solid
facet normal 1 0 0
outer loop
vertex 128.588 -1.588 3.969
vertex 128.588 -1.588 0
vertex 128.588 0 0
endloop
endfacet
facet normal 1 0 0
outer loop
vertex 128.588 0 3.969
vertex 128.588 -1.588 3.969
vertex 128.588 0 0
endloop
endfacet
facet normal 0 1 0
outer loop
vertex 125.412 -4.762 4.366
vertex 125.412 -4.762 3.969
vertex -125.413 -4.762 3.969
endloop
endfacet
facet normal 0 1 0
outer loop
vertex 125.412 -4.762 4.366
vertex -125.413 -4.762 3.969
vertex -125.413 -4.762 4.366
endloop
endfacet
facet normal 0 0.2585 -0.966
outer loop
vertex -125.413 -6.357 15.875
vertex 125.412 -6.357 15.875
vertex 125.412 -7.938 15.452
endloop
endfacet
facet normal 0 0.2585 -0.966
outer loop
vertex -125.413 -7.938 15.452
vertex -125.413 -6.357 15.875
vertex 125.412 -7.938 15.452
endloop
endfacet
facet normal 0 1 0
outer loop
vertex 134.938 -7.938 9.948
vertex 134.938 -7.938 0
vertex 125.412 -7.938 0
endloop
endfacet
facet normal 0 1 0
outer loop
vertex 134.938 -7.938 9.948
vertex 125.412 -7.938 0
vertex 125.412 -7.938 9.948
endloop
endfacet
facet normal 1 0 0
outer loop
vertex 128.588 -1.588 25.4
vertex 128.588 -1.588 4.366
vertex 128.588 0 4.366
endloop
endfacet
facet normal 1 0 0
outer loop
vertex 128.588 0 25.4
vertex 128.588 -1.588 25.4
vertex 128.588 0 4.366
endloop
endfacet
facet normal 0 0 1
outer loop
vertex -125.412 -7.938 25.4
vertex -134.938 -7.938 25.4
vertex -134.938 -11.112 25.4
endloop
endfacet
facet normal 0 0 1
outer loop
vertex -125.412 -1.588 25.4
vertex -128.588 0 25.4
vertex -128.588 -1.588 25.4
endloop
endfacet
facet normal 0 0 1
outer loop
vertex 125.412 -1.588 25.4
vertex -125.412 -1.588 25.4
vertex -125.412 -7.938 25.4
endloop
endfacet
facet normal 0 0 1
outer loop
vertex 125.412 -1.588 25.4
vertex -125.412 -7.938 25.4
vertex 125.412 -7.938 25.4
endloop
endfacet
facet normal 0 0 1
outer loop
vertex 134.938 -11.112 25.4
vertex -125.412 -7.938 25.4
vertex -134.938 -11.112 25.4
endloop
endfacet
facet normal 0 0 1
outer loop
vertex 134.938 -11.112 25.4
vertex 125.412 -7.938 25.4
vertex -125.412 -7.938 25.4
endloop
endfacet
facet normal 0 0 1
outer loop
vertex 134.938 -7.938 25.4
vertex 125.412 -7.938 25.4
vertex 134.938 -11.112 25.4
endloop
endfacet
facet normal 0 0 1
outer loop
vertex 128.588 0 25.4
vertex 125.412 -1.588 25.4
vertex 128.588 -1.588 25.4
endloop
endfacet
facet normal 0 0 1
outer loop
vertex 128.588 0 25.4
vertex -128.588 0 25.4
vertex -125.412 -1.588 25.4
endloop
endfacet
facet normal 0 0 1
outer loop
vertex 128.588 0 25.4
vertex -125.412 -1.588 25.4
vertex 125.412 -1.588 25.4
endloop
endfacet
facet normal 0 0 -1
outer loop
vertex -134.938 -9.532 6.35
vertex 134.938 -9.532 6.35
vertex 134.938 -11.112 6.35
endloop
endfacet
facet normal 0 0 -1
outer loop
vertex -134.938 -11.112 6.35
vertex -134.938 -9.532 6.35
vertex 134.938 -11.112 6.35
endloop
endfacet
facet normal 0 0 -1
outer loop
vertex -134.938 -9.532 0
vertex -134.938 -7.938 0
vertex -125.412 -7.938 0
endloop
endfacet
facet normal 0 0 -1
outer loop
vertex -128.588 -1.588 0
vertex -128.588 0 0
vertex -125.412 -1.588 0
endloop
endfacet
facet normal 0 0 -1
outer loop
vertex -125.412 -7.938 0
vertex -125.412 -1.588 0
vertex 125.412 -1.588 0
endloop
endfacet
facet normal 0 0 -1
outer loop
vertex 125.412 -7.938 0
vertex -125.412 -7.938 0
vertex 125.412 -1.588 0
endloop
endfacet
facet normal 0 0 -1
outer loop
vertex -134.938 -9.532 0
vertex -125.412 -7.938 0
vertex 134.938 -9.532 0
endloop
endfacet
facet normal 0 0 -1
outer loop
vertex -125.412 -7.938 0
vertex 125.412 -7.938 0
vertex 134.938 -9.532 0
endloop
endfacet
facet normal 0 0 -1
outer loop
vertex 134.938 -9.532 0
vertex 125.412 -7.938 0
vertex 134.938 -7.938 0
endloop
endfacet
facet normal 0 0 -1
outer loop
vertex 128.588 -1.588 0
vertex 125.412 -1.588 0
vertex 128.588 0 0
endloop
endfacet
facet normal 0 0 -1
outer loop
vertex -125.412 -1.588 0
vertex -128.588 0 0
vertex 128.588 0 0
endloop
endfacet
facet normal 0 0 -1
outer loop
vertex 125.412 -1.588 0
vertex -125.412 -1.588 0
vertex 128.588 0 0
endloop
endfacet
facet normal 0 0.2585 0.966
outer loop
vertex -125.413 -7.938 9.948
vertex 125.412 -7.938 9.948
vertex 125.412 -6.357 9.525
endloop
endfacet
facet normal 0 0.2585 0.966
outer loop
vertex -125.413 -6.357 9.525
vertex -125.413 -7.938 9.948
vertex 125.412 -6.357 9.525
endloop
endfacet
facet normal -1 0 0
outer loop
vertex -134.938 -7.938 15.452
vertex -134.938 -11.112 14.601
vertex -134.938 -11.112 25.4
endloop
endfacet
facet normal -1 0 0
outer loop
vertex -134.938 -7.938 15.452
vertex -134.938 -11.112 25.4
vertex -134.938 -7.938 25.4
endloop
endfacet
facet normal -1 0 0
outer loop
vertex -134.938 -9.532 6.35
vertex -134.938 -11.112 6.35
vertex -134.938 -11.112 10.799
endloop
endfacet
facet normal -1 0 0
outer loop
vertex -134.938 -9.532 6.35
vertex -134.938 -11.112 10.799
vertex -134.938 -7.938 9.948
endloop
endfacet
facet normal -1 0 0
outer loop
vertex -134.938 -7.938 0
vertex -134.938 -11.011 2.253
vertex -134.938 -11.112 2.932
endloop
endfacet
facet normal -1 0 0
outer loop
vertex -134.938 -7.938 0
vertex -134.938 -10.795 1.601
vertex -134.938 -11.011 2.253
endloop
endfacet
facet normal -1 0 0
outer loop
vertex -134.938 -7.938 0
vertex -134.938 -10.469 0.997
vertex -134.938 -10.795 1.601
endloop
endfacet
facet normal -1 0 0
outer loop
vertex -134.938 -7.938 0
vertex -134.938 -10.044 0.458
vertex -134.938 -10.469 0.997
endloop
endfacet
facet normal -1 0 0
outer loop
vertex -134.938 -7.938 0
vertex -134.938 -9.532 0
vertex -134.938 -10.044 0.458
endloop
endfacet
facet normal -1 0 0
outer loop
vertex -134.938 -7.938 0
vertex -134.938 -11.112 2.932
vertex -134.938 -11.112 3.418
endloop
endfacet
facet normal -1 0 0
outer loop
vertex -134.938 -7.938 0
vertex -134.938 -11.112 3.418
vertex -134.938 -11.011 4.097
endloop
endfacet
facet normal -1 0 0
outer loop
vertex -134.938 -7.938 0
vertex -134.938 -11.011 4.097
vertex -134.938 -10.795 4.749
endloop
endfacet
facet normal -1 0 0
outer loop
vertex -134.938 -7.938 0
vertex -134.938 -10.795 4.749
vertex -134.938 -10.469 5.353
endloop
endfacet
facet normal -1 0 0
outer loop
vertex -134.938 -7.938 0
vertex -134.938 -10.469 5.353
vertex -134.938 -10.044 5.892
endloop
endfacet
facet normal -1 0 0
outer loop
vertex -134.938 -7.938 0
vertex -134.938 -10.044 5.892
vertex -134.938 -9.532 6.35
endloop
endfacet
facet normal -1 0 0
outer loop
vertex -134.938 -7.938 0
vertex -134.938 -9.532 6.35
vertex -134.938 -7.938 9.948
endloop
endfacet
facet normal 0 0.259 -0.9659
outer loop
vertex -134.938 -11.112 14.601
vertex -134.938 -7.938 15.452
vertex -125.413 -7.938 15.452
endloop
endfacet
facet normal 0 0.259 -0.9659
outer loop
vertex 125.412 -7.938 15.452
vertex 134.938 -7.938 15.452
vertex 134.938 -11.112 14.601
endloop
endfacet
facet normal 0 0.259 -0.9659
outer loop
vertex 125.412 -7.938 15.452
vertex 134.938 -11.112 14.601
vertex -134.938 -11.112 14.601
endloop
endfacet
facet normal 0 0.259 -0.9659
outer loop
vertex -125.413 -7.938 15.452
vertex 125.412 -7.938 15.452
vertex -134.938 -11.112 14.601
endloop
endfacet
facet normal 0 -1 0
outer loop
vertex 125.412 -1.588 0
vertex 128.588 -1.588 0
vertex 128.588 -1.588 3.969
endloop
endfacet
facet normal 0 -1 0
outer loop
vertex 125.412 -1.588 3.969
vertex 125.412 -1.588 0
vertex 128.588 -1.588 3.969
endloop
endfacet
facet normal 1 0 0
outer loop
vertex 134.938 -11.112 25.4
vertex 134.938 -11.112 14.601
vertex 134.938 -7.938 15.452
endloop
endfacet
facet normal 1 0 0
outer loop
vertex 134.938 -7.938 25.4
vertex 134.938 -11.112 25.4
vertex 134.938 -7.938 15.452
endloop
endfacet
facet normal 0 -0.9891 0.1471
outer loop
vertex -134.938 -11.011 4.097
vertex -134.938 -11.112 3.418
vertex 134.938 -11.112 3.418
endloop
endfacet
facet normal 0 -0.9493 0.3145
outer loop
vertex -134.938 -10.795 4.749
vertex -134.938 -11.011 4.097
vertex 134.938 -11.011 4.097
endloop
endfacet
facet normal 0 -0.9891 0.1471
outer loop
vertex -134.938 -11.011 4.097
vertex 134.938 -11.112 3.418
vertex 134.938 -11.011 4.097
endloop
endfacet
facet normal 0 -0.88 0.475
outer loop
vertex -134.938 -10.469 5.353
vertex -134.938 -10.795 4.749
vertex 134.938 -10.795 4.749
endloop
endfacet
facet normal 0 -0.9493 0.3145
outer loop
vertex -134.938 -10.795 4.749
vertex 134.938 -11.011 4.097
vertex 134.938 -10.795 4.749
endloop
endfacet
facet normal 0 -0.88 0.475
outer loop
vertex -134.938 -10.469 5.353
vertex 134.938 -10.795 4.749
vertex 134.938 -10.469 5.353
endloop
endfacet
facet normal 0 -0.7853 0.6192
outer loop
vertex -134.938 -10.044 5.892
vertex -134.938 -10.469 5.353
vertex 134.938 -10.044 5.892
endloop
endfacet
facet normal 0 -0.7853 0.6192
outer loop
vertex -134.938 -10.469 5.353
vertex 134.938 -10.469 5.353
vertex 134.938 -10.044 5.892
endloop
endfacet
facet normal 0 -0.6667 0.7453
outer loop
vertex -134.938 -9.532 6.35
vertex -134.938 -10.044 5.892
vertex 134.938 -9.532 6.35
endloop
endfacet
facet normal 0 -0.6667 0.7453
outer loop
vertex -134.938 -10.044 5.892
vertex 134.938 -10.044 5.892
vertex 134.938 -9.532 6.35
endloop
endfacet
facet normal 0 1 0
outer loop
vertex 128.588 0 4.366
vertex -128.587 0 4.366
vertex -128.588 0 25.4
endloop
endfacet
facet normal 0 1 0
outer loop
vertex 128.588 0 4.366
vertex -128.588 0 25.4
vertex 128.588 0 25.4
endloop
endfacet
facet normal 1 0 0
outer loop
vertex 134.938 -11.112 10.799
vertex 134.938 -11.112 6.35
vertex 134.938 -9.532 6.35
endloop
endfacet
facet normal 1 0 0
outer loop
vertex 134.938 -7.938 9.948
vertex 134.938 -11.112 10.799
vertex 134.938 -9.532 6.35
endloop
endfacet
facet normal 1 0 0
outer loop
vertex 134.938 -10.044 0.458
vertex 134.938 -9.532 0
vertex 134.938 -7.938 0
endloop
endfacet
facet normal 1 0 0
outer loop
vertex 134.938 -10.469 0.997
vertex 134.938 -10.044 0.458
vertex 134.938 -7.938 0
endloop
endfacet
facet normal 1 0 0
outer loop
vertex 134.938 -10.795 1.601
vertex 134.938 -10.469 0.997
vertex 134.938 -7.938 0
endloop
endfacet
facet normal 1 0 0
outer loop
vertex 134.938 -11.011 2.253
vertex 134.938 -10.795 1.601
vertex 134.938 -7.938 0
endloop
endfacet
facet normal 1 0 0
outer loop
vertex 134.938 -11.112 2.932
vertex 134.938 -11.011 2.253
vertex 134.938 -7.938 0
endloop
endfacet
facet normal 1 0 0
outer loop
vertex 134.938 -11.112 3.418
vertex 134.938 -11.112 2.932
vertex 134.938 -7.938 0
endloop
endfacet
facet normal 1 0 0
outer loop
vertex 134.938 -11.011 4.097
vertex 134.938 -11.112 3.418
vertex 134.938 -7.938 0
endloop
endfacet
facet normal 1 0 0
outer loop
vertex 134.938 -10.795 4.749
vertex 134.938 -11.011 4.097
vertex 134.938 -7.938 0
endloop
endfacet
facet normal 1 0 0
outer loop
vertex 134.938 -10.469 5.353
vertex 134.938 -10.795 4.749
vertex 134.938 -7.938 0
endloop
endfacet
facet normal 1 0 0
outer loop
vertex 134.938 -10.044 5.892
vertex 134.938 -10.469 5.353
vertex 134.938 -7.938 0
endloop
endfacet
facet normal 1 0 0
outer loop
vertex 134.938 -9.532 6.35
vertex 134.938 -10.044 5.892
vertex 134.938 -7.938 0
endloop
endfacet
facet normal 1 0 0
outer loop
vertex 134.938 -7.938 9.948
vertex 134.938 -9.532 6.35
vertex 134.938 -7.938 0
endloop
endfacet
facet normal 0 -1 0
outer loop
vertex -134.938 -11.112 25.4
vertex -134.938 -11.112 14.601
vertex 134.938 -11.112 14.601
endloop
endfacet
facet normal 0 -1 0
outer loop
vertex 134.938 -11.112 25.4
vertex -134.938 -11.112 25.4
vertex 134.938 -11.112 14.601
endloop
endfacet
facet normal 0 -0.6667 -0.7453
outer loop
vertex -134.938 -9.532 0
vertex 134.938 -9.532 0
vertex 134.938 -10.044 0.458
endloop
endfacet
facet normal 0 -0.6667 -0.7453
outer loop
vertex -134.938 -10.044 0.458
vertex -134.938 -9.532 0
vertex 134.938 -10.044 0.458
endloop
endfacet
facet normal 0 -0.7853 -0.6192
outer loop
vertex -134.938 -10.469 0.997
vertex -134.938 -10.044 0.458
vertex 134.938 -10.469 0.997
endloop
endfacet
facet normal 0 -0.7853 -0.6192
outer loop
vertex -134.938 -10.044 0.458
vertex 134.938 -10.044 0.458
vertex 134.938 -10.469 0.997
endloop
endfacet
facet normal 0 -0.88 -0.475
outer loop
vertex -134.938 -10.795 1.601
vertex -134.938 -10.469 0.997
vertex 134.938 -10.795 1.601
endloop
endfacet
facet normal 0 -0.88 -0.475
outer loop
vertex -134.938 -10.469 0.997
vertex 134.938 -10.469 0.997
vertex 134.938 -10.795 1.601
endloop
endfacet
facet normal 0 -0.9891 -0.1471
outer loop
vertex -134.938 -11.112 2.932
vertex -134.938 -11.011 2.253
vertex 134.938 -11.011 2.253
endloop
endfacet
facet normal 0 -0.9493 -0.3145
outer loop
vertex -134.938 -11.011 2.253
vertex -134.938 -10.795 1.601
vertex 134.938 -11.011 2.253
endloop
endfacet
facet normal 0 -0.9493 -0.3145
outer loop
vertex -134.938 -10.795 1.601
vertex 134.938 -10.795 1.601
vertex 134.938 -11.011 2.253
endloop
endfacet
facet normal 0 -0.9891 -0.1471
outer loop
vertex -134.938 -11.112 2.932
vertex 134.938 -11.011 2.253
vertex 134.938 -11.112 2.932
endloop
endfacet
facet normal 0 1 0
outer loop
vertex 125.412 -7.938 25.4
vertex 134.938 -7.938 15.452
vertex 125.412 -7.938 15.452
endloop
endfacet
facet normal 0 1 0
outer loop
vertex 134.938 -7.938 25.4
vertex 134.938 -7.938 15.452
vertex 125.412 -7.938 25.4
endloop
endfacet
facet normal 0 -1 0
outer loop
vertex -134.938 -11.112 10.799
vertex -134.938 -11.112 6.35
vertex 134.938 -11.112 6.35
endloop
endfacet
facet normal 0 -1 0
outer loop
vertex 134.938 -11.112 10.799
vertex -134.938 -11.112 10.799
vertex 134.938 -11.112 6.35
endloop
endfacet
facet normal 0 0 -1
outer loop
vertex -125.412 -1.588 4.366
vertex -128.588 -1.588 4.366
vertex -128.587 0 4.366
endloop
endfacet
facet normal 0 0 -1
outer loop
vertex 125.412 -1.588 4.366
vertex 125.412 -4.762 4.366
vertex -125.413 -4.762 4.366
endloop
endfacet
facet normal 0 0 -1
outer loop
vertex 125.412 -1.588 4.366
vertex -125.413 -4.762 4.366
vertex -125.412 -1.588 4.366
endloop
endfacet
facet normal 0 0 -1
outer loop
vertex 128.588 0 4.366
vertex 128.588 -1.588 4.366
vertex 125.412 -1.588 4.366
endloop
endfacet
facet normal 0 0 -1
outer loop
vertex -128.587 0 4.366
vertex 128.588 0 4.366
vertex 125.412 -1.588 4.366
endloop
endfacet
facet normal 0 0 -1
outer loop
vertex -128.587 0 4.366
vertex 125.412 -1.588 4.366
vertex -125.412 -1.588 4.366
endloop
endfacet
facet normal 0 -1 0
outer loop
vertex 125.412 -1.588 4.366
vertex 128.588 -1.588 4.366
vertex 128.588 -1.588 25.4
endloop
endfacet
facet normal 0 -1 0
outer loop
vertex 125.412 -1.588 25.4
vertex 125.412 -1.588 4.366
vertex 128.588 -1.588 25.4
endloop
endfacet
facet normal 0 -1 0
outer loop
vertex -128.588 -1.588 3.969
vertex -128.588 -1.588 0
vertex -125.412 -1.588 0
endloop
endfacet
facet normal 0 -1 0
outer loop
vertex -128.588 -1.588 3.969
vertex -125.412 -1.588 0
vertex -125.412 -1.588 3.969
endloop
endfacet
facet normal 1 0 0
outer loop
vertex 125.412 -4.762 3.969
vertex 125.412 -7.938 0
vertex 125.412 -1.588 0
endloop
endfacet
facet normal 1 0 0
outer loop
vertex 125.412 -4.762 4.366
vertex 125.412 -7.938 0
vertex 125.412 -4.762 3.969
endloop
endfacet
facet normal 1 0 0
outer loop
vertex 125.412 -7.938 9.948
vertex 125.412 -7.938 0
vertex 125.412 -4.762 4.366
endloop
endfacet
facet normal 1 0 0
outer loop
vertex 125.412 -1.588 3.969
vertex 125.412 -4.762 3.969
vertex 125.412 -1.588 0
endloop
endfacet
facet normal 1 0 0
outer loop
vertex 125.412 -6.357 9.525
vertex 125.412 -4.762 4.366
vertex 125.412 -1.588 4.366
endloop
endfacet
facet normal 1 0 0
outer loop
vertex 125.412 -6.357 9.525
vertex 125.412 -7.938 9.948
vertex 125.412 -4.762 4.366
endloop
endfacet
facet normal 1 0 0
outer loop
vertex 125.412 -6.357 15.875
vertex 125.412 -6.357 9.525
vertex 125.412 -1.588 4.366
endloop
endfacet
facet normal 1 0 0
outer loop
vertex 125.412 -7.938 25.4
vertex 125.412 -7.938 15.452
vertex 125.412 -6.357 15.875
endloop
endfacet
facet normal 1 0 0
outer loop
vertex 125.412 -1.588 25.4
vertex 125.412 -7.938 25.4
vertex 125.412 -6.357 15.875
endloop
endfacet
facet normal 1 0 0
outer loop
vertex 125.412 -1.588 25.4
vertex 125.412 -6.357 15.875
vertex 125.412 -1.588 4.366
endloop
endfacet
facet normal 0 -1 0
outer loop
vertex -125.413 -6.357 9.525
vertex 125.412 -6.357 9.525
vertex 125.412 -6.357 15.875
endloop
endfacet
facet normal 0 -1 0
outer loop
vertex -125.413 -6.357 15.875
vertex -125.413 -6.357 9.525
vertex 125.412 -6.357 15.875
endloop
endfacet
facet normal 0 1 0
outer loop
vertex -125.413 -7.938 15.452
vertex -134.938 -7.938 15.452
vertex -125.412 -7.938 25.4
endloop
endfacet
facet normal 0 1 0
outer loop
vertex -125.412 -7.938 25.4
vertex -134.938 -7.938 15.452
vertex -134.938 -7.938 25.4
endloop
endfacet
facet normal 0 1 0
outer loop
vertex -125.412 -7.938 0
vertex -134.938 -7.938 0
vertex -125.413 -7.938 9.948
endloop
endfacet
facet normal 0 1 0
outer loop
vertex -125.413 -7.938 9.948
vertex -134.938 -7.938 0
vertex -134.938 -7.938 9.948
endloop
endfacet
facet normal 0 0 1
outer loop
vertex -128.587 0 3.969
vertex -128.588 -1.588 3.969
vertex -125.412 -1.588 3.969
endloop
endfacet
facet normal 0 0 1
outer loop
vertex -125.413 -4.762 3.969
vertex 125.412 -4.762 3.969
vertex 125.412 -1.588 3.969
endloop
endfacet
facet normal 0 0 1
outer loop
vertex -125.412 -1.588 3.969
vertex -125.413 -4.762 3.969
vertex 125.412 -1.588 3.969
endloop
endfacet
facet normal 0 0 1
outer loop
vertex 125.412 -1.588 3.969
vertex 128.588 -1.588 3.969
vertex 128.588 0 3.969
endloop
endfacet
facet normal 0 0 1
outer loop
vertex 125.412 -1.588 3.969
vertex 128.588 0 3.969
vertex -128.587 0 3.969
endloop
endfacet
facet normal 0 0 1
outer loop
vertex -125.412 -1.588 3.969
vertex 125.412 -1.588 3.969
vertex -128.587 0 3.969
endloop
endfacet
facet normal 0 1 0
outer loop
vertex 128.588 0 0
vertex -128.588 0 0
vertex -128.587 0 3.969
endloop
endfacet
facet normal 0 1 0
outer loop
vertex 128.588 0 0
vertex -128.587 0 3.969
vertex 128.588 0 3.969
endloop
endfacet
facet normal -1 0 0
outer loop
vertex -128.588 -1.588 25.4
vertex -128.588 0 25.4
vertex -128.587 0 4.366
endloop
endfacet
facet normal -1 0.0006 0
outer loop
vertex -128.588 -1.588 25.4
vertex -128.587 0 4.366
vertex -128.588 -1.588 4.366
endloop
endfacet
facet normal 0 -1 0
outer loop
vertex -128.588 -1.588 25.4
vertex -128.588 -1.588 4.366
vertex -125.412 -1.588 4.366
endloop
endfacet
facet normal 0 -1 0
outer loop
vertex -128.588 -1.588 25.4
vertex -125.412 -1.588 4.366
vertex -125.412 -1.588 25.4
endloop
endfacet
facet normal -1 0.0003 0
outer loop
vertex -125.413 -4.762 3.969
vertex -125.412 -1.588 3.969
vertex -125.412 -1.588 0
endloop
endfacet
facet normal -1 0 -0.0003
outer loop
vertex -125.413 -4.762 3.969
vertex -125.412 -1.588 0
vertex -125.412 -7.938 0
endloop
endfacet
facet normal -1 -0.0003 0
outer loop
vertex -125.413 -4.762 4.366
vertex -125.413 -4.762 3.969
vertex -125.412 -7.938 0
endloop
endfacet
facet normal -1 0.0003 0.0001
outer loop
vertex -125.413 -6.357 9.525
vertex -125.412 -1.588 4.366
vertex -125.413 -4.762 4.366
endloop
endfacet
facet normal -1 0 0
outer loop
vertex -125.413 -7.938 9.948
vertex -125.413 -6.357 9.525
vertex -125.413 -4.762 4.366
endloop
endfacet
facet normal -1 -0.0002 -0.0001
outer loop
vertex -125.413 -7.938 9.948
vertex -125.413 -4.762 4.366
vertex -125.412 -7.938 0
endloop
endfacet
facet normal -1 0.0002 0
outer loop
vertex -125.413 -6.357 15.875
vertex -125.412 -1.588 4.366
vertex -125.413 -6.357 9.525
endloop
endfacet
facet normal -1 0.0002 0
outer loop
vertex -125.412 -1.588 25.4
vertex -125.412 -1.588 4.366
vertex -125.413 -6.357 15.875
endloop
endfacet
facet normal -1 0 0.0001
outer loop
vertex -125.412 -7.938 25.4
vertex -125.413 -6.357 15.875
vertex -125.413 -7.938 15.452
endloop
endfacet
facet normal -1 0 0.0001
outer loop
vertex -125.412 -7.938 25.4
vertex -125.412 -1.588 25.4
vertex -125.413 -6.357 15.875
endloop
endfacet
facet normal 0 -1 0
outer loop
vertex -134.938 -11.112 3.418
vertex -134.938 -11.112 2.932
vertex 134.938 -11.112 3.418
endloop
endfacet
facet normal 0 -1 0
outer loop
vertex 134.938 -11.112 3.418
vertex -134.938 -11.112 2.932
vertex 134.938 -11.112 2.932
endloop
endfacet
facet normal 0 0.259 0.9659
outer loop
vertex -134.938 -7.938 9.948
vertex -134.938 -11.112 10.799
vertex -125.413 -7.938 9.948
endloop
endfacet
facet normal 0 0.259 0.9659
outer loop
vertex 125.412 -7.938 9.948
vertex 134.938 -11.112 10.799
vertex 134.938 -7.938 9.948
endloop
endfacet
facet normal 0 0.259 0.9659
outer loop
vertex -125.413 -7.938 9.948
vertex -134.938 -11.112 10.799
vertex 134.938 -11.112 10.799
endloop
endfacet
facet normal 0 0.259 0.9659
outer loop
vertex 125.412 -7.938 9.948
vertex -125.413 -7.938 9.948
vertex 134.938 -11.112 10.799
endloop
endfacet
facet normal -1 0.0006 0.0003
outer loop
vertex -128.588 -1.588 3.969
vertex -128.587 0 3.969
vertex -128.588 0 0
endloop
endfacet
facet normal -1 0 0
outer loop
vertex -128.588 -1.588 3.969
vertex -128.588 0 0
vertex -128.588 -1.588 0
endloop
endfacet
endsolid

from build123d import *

# Parameters (mm, degrees)
F0_W      = 269.875
F0_H      = 11.1125
F1_DEPTH  = 25.4
F2_W      = 6.35
F2_H      = 25.4
F3_DEPTH  = 9.525
F4_DEPTH  = 6.35
F5_W      = 1.5875
F5_H      = 25.4
F6_DEPTH  = 6.35
F5_W_2    = 6.35
F7_DEPTH  = 9.525
F8_W      = 4.7625
F8_H      = 0.396875
F9_DEPTH  = 269.876
F11_DEPTH = 269.876
F12_DEPTH = 269.875
F13_DEPTH = 269.876


with BuildPart() as f1:
    # F0 (on Top) → F1 (new body)
    with BuildSketch(Plane.XY):
        with Locations((0, -5.55625)):
            Rectangle(F0_W, F0_H)
    extrude(amount=F1_DEPTH)

    # F2 (on face) → F3 (cut)
    with BuildSketch(Plane.YZ.offset(134.9375)):
        with Locations((-4.7625, 12.7)):
            Rectangle(F2_W, F2_H)
    extrude(amount=-F3_DEPTH, mode=Mode.SUBTRACT)

    # F4 (cut): a face of the model
    f4_faces = [f1.faces().sort_by_distance(p)[0] for p in [
        (134.9375, -0.79375, 12.7),
    ]]
    extrude(f4_faces, amount=-F4_DEPTH, mode=Mode.SUBTRACT)

    # F5 (on face) → F6 (cut)
    with BuildSketch(Plane(origin=(-134.9375, 0, 0), x_dir=(0, -1, 0), z_dir=(-1, 0, 0))):
        with Locations((0.79375, 12.7)):
            Rectangle(F5_W, F5_H)
    extrude(amount=-F6_DEPTH, mode=Mode.SUBTRACT)

    # F5 (on face) → F7 (cut)
    with BuildSketch(Plane(origin=(-134.9375, 0, 0), x_dir=(0, -1, 0), z_dir=(-1, 0, 0))):
        with Locations((4.7625, 12.7)):
            Rectangle(F5_W_2, F5_H)
    extrude(amount=-F7_DEPTH, mode=Mode.SUBTRACT)

    # F8 (on face) → F9 (cut, through all)
    with BuildSketch(Plane.YZ.offset(134.9375)):
        with Locations((-2.38125, 4.1671875)):
            Rectangle(F8_W, F8_H)
    extrude(amount=-F9_DEPTH, mode=Mode.SUBTRACT)

    # F10 (on face) → F11 (cut, through all)
    with BuildSketch(Plane.YZ.offset(134.9375)):
        with BuildLine():
            ThreePointArc((-9.5324710518, 0), (-10.6448555046, 1.2920515481), (-11.1125, 2.931595692))
            Line((-11.1125, 2.931595692), (-11.1125, 0))
            Line((-11.1125, 0), (-9.5324710518, 0))
        make_face()
        with BuildLine():
            Line((-11.1125, 3.418404308), (-11.1125, 6.35))
            Line((-11.1125, 6.35), (-11.1199710518, 6.35))
            Line((-11.1199710518, 6.35), (-11.1199710518, 3.175))
            ThreePointArc((-11.1199710518, 3.175), (-11.1181028492, 3.2967594696), (-11.1125, 3.418404308))
        make_face()
    extrude(amount=-F11_DEPTH, mode=Mode.SUBTRACT)

    # F10 (on face) → F12 (cut, through all)
    with BuildSketch(Plane.YZ.offset(134.9375)):
        with BuildLine():
            ThreePointArc((-11.1125, 3.418404308), (-10.6448555046, 5.0579484519), (-9.5324710518, 6.35))
            Line((-9.5324710518, 6.35), (-11.1125, 6.35))
            Line((-11.1125, 6.35), (-11.1125, 3.418404308))
        make_face()
    extrude(amount=-F12_DEPTH, mode=Mode.SUBTRACT)

    # F10 (on face) → F13 (cut, through all)
    with BuildSketch(Plane.YZ.offset(134.9375)):
        Polygon((-11.1125, 12.7), (-11.1125, 10.7991061667), (-7.9375, 9.9483674807), (-7.9375, 12.7), align=None)
        Polygon((-7.9375, 12.7), (-7.9375, 9.9483674807), (-6.3574710518, 9.525), (-6.3574710518, 12.7), align=None)
        Polygon((-11.1125, 14.6008938333), (-11.1125, 12.7), (-7.9375, 12.7), (-7.9375, 15.4516325193), align=None)
        Polygon((-7.9375, 15.4516325193), (-7.9375, 12.7), (-6.3574710518, 12.7), (-6.3574710518, 15.875), align=None)
    extrude(amount=-F13_DEPTH, mode=Mode.SUBTRACT)


solid = f1.part
